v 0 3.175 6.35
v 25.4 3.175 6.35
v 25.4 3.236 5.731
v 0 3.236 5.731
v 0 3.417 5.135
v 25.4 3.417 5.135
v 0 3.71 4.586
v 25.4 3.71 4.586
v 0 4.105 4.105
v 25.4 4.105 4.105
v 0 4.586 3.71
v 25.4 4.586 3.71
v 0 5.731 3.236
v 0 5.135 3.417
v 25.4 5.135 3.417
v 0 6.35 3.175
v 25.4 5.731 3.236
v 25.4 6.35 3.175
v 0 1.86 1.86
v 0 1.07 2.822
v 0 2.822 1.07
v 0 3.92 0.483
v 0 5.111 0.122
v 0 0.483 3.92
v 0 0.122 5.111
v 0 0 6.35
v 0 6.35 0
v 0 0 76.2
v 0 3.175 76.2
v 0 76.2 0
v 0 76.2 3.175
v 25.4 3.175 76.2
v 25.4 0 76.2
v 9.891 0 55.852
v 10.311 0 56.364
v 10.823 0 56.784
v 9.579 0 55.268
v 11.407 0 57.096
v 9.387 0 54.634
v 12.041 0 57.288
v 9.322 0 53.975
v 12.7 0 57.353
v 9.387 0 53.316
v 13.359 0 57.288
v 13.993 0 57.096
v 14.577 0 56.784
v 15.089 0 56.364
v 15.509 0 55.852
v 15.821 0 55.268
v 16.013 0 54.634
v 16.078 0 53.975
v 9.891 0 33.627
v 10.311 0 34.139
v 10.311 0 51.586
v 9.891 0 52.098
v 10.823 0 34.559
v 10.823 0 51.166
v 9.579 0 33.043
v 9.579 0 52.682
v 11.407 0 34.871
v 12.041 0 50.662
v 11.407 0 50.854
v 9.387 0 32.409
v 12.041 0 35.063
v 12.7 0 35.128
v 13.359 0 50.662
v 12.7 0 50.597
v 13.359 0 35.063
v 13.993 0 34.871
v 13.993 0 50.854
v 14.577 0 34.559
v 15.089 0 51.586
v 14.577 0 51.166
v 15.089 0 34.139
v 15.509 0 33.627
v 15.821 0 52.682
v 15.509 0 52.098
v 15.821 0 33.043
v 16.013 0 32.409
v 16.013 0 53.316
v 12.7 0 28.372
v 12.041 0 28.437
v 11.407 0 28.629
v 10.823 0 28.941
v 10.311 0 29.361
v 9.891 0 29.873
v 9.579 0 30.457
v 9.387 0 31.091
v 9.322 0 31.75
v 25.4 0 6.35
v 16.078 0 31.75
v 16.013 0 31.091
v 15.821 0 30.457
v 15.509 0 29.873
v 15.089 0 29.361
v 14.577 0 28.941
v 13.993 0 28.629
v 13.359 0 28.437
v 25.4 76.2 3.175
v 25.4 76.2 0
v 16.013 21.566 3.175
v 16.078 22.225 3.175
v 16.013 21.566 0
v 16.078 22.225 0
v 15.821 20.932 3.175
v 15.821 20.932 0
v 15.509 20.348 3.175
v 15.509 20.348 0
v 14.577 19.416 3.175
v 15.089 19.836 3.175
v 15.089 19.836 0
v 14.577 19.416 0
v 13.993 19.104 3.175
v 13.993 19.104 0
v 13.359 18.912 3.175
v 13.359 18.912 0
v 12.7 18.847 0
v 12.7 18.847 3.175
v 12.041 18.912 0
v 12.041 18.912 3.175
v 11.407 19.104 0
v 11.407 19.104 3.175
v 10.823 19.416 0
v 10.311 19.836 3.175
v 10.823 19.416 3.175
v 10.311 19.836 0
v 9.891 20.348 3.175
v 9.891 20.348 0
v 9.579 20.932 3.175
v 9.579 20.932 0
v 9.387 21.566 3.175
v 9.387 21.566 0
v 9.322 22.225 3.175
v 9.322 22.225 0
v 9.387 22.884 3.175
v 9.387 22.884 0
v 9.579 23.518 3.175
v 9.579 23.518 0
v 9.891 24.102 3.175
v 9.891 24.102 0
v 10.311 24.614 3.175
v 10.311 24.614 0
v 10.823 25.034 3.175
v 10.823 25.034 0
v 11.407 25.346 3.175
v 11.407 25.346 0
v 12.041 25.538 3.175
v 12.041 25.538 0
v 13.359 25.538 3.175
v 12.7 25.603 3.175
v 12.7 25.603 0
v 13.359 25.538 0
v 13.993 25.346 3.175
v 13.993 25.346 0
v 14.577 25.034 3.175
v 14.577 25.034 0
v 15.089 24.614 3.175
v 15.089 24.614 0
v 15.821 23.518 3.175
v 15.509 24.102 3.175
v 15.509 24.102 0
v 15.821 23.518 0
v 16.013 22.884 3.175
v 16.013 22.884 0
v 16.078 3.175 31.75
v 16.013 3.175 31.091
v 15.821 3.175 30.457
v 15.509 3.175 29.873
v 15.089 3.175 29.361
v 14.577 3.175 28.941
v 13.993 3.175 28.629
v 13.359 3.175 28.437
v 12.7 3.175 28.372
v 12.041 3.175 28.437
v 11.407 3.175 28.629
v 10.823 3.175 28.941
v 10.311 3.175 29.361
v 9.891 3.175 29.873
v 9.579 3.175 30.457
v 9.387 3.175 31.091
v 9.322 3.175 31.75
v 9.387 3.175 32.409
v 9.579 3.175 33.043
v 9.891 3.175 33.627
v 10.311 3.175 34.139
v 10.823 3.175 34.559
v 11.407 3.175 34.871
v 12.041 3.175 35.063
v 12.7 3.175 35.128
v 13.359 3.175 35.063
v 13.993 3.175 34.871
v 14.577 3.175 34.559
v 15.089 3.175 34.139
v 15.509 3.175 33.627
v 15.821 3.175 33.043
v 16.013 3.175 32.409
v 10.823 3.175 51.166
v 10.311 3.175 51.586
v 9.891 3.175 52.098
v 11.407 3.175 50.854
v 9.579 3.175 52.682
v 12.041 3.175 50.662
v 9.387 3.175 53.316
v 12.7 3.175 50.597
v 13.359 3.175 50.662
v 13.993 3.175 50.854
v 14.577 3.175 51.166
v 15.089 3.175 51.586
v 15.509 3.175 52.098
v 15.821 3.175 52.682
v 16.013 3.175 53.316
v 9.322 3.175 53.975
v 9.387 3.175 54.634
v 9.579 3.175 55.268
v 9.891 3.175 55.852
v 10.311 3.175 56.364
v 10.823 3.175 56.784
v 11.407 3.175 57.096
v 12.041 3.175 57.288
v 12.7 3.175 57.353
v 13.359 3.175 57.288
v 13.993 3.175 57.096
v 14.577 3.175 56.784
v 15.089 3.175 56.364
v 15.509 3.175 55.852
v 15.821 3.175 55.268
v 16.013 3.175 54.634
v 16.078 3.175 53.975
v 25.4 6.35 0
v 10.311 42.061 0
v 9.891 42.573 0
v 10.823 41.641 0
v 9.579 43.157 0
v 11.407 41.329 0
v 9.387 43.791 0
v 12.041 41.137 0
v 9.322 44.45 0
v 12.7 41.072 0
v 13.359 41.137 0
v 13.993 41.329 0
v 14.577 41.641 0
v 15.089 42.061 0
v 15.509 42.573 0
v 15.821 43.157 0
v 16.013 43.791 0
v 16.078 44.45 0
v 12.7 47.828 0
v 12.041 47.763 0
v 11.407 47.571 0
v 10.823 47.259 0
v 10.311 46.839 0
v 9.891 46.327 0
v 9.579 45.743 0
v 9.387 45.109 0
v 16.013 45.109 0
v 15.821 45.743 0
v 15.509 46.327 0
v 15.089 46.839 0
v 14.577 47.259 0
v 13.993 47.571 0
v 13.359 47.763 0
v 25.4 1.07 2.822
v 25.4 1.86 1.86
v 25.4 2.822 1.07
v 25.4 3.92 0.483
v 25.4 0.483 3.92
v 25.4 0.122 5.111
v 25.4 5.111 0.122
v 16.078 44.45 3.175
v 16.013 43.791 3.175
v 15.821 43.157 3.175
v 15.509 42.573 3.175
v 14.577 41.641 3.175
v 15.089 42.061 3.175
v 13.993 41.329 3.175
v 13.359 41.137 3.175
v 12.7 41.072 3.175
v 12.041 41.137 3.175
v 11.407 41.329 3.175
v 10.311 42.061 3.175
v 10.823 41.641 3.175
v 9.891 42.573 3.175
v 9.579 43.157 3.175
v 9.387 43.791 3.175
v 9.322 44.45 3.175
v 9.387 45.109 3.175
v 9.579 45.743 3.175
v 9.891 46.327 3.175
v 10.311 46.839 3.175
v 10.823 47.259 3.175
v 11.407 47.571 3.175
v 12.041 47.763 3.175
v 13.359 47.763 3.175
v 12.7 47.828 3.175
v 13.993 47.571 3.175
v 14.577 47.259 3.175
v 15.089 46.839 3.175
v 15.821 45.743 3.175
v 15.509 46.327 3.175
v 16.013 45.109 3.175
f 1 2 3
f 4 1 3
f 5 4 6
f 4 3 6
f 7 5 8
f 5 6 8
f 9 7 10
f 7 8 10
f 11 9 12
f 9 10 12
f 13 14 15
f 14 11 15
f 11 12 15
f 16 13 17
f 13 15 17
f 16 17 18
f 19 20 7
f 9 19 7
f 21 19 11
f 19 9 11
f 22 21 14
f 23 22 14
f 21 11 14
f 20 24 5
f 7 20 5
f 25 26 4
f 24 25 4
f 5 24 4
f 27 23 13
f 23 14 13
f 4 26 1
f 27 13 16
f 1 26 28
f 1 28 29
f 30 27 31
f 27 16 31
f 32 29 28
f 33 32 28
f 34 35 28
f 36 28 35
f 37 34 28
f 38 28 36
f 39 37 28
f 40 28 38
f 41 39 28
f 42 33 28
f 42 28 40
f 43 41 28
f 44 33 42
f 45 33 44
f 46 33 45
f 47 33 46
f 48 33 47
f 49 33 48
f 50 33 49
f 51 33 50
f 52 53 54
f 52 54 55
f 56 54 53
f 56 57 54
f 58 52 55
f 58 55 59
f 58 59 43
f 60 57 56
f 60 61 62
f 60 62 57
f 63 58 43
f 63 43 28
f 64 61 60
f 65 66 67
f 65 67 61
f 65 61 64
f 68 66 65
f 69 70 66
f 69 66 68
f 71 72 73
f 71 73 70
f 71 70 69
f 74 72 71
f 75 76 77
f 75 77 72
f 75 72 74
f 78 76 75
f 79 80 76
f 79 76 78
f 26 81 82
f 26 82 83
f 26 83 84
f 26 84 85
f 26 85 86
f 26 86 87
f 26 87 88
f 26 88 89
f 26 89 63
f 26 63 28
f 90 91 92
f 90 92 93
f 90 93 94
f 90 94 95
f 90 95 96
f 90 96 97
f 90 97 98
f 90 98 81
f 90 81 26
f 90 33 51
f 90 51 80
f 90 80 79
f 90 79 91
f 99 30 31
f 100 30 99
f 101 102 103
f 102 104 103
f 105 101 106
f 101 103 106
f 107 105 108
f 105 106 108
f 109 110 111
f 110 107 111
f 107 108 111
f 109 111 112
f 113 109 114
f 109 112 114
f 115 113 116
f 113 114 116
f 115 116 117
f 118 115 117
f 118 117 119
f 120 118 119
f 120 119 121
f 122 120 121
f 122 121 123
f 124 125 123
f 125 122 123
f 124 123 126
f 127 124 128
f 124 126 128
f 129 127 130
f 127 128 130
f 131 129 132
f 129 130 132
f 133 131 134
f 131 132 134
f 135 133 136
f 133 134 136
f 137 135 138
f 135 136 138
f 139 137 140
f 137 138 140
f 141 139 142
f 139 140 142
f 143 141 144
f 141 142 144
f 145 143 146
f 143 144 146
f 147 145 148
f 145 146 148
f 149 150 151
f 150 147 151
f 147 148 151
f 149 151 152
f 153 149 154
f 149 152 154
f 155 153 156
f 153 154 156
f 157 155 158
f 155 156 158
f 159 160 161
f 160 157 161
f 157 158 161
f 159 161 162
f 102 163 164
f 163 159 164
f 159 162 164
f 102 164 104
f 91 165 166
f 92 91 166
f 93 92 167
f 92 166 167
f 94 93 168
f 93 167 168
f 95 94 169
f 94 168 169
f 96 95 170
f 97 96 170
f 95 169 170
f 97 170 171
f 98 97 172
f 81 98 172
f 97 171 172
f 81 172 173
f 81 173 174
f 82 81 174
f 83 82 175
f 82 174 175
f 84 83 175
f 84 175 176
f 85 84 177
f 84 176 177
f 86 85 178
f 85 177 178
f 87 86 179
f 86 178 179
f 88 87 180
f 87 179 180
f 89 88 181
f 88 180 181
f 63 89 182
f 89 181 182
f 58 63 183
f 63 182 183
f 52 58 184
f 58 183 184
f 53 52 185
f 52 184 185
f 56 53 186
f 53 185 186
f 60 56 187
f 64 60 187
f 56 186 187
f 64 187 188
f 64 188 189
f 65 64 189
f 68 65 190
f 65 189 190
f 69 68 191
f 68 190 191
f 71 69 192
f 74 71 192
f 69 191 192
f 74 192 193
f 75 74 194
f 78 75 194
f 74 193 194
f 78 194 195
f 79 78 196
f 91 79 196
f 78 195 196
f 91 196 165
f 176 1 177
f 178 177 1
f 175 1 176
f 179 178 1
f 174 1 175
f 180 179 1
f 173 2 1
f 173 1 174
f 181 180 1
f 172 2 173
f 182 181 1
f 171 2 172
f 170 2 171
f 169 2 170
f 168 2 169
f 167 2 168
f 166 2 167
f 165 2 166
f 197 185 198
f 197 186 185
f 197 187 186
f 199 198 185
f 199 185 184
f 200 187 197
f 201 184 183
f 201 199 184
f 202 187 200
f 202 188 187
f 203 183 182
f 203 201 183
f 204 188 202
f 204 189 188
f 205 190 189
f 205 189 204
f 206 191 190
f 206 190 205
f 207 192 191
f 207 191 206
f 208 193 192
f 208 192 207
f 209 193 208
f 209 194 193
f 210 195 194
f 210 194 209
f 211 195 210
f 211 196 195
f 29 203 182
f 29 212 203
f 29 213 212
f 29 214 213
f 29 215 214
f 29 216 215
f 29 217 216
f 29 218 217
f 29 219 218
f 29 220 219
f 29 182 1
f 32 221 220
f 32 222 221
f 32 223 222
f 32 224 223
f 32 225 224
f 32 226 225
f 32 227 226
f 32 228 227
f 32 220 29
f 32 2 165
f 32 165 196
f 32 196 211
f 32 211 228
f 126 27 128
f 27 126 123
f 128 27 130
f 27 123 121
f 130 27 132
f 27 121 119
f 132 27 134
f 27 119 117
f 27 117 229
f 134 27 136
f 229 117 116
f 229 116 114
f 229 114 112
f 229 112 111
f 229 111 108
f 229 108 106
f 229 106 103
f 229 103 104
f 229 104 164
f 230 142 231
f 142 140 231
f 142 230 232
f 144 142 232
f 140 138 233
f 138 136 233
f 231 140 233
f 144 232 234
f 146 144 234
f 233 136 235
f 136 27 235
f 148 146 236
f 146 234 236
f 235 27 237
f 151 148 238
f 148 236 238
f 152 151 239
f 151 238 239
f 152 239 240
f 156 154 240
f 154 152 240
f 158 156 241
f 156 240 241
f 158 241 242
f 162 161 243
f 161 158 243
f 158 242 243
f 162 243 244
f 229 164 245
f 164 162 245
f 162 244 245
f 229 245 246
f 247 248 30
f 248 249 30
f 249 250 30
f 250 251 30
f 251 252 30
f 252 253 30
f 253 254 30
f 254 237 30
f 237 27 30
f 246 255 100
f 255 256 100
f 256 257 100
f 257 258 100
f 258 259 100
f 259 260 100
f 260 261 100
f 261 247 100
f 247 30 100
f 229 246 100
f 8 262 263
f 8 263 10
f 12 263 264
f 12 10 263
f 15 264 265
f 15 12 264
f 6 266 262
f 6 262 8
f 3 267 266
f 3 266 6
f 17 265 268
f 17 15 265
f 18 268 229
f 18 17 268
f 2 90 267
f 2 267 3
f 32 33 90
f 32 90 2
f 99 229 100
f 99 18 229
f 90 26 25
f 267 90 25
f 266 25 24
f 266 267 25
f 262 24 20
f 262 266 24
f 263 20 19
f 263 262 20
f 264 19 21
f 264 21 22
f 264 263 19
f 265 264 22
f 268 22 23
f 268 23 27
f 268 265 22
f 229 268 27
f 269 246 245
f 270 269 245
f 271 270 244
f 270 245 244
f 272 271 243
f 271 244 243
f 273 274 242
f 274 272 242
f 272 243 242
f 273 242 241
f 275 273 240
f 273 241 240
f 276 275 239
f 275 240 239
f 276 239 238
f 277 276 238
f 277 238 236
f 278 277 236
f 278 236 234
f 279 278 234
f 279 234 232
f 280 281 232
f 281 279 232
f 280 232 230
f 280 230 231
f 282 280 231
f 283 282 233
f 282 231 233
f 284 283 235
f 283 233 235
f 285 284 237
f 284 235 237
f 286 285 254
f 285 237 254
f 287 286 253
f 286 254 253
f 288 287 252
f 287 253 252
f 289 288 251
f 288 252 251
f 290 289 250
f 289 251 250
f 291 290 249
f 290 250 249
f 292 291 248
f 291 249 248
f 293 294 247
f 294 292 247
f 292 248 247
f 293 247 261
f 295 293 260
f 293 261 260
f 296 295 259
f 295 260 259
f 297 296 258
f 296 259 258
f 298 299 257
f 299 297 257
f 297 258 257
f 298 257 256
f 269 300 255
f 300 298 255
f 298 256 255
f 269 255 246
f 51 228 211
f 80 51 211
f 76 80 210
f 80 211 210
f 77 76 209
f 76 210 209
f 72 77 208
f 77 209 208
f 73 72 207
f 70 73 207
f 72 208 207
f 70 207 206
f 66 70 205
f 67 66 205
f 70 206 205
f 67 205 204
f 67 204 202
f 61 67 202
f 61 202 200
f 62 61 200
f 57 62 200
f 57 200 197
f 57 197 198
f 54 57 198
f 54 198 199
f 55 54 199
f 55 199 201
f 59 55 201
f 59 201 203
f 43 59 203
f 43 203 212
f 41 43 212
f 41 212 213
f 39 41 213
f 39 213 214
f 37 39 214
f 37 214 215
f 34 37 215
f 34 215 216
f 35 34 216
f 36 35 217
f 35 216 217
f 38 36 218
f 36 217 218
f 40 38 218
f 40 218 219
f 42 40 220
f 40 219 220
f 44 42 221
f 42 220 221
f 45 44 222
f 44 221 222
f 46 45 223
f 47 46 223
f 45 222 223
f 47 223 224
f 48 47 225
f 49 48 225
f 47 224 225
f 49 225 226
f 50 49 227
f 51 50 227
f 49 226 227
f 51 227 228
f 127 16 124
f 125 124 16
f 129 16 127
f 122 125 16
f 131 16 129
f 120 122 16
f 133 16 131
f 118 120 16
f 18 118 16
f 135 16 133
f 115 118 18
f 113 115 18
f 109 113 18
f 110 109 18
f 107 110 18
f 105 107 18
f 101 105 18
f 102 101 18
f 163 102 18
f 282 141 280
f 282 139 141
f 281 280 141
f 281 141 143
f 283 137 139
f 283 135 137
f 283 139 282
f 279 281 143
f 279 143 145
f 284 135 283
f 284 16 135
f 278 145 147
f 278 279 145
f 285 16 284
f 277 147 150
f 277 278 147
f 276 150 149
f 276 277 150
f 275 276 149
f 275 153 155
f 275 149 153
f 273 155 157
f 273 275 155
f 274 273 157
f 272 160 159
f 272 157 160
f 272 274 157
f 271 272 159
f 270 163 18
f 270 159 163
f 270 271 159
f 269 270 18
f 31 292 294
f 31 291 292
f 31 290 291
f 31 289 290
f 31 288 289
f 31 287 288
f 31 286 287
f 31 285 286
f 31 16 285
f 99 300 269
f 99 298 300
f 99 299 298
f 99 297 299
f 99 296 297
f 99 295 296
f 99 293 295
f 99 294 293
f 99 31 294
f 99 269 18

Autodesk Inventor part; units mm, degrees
ref_plane "YZ Plane" through (0, 0, 0) normal (1, 0, 0) x (0, 1, 0)
ref_plane "XZ Plane" through (0, 0, 0) normal (0, 1, 0) x (-1, 0, 0)
ref_plane "XY Plane" through (0, 0, 0) normal (0, 0, 1) x (1, 0, 0)
sketch "Sketch1" plane through (0, 0, 0) normal (0, 0, 1) x (1, 0, 0)
  line L0 (0, 0) -> (146.881681, 0)
  line L1 (146.881681, -25.4) -> (0, -25.4)
  line L2 (0, 0) -> (73.44084, 0)
  line L3 (73.44084, 0) -> (73.44084, -3.175)
  line L4 (73.44084, -3.175) -> (71.84064, -3.175)
  line L5 (71.84064, -3.175) -> (71.84064, -9.525)
  line L6 (71.84064, -9.525) -> (75.01564, -9.525)
  line L7 (75.01564, -9.525) -> (75.01564, -3.175)
  line L8 (75.01564, -3.175) -> (73.44084, -3.175)
  line L9 (73.44084, -25.4) -> (73.44084, -22.225)
  line L10 (73.44084, -22.225) -> (71.84064, -22.225)
  line L11 (71.84064, -22.225) -> (71.84064, -15.875)
  line L12 (71.84064, -15.875) -> (75.01564, -15.875)
  line L13 (75.01564, -15.875) -> (75.01564, -22.225)
  line L14 (75.01564, -22.225) -> (73.44084, -22.225)
  dimension "d8" = 6.7564
sketch "Sketch3" plane through (0, 3.175, 76.2) normal (0, 1, 0) x (1, 0, 0)
  line L0 (0, 0) -> (25.4, 0) projected
  circle A0 centre (12.7, 44.45) radius 3.3782
  circle A1 centre (12.7, 22.225) radius 3.3782
  line L1 (0, 76.2) -> (0, 73.025) projected
  dimension "d21" = 6.7564
  dimension "d22" = 6.7564
  dimension "d23" = 12.7
  dimension "d24" = 22.225
  dimension "d25" = 22.225
sketch "Sketch1 outline for Plate1" plane through (0, 0, 0) normal (0, 0, 1) x (1, 0, 0)
  line L0 (0, 0) -> (0, 76.2)
  line L1 (25.4, 0) -> (0, 0)
  line L2 (0, 76.2) -> (25.4, 76.2)
  line L3 (25.4, 76.2) -> (25.4, 0)
  circle A0 centre (12.7, 22.225) radius 3.3782
  circle A1 centre (12.7, 44.45) radius 3.3782
extrude "Plate1" add sketch "Sketch1 outline for Plate1" along normal blind 3.175
sketch "Sketch2" plane through (25.4, 3.175, 0) normal (0, -1, 0) x (1, 0, 0)
  line L0 (-25.4, 0) -> (0, 0)
  line L1 (0, 0) -> (0, 76.2)
  line L2 (0, 76.2) -> (-25.4, 76.2)
  line L3 (-25.4, 76.2) -> (-25.4, 0)
edge flange "Flange1" height 76.2 angle 90 thickness 3.175 bend radius 3.175 thickness toward (0, -1, 0) relief tear relief width 3.175 relief depth 1.5875 edges at (12.7, 0, 3.175) wall of the first edge with corners at (0, 3.175, 0) (25.4, 3.175, 0) (25.4, 3.175, 76.2) (0, 3.175, 76.2)
bend "Bend1"
corner "Corner1"
extrude "Cut1" cut sketch "Sketch3" against normal blind 3.175
equation "\"d11\" = BendReliefWidth"
equation "\"d12\" = BendReliefDepth"
equation "\"d13\" = MinimumRemnant"
equation "\"d14\" = BendRadius"
equation "\"d17\" = BendRadius"
equation "\"d18\" = CornerReliefSize"
equation "\"d19\" = GapSize"
equation "\"d20\" = JacobiRadiusSize"
equation "\"BendRadius\" = Thickness"
equation "\"BendReliefWidth\" = Thickness"
equation "\"BendReliefDepth\" = 0.5 * Thickness"
equation "\"CornerReliefSize\" = 4 * Thickness"
equation "\"MinimumRemnant\" = 2 * Thickness"
equation "\"TransitionRadius\" = BendRadius"
equation "\"JacobiRadiusSize\" = BendRadius"
equation "\"GapSize\" = Thickness"
equation "\"d10\" = BendRadius"
equation "\"d6\" = Thickness"
equation "\"Thickness\" = 3.175"
properties part number "Gusset 4" material "Aluminum 6061"
